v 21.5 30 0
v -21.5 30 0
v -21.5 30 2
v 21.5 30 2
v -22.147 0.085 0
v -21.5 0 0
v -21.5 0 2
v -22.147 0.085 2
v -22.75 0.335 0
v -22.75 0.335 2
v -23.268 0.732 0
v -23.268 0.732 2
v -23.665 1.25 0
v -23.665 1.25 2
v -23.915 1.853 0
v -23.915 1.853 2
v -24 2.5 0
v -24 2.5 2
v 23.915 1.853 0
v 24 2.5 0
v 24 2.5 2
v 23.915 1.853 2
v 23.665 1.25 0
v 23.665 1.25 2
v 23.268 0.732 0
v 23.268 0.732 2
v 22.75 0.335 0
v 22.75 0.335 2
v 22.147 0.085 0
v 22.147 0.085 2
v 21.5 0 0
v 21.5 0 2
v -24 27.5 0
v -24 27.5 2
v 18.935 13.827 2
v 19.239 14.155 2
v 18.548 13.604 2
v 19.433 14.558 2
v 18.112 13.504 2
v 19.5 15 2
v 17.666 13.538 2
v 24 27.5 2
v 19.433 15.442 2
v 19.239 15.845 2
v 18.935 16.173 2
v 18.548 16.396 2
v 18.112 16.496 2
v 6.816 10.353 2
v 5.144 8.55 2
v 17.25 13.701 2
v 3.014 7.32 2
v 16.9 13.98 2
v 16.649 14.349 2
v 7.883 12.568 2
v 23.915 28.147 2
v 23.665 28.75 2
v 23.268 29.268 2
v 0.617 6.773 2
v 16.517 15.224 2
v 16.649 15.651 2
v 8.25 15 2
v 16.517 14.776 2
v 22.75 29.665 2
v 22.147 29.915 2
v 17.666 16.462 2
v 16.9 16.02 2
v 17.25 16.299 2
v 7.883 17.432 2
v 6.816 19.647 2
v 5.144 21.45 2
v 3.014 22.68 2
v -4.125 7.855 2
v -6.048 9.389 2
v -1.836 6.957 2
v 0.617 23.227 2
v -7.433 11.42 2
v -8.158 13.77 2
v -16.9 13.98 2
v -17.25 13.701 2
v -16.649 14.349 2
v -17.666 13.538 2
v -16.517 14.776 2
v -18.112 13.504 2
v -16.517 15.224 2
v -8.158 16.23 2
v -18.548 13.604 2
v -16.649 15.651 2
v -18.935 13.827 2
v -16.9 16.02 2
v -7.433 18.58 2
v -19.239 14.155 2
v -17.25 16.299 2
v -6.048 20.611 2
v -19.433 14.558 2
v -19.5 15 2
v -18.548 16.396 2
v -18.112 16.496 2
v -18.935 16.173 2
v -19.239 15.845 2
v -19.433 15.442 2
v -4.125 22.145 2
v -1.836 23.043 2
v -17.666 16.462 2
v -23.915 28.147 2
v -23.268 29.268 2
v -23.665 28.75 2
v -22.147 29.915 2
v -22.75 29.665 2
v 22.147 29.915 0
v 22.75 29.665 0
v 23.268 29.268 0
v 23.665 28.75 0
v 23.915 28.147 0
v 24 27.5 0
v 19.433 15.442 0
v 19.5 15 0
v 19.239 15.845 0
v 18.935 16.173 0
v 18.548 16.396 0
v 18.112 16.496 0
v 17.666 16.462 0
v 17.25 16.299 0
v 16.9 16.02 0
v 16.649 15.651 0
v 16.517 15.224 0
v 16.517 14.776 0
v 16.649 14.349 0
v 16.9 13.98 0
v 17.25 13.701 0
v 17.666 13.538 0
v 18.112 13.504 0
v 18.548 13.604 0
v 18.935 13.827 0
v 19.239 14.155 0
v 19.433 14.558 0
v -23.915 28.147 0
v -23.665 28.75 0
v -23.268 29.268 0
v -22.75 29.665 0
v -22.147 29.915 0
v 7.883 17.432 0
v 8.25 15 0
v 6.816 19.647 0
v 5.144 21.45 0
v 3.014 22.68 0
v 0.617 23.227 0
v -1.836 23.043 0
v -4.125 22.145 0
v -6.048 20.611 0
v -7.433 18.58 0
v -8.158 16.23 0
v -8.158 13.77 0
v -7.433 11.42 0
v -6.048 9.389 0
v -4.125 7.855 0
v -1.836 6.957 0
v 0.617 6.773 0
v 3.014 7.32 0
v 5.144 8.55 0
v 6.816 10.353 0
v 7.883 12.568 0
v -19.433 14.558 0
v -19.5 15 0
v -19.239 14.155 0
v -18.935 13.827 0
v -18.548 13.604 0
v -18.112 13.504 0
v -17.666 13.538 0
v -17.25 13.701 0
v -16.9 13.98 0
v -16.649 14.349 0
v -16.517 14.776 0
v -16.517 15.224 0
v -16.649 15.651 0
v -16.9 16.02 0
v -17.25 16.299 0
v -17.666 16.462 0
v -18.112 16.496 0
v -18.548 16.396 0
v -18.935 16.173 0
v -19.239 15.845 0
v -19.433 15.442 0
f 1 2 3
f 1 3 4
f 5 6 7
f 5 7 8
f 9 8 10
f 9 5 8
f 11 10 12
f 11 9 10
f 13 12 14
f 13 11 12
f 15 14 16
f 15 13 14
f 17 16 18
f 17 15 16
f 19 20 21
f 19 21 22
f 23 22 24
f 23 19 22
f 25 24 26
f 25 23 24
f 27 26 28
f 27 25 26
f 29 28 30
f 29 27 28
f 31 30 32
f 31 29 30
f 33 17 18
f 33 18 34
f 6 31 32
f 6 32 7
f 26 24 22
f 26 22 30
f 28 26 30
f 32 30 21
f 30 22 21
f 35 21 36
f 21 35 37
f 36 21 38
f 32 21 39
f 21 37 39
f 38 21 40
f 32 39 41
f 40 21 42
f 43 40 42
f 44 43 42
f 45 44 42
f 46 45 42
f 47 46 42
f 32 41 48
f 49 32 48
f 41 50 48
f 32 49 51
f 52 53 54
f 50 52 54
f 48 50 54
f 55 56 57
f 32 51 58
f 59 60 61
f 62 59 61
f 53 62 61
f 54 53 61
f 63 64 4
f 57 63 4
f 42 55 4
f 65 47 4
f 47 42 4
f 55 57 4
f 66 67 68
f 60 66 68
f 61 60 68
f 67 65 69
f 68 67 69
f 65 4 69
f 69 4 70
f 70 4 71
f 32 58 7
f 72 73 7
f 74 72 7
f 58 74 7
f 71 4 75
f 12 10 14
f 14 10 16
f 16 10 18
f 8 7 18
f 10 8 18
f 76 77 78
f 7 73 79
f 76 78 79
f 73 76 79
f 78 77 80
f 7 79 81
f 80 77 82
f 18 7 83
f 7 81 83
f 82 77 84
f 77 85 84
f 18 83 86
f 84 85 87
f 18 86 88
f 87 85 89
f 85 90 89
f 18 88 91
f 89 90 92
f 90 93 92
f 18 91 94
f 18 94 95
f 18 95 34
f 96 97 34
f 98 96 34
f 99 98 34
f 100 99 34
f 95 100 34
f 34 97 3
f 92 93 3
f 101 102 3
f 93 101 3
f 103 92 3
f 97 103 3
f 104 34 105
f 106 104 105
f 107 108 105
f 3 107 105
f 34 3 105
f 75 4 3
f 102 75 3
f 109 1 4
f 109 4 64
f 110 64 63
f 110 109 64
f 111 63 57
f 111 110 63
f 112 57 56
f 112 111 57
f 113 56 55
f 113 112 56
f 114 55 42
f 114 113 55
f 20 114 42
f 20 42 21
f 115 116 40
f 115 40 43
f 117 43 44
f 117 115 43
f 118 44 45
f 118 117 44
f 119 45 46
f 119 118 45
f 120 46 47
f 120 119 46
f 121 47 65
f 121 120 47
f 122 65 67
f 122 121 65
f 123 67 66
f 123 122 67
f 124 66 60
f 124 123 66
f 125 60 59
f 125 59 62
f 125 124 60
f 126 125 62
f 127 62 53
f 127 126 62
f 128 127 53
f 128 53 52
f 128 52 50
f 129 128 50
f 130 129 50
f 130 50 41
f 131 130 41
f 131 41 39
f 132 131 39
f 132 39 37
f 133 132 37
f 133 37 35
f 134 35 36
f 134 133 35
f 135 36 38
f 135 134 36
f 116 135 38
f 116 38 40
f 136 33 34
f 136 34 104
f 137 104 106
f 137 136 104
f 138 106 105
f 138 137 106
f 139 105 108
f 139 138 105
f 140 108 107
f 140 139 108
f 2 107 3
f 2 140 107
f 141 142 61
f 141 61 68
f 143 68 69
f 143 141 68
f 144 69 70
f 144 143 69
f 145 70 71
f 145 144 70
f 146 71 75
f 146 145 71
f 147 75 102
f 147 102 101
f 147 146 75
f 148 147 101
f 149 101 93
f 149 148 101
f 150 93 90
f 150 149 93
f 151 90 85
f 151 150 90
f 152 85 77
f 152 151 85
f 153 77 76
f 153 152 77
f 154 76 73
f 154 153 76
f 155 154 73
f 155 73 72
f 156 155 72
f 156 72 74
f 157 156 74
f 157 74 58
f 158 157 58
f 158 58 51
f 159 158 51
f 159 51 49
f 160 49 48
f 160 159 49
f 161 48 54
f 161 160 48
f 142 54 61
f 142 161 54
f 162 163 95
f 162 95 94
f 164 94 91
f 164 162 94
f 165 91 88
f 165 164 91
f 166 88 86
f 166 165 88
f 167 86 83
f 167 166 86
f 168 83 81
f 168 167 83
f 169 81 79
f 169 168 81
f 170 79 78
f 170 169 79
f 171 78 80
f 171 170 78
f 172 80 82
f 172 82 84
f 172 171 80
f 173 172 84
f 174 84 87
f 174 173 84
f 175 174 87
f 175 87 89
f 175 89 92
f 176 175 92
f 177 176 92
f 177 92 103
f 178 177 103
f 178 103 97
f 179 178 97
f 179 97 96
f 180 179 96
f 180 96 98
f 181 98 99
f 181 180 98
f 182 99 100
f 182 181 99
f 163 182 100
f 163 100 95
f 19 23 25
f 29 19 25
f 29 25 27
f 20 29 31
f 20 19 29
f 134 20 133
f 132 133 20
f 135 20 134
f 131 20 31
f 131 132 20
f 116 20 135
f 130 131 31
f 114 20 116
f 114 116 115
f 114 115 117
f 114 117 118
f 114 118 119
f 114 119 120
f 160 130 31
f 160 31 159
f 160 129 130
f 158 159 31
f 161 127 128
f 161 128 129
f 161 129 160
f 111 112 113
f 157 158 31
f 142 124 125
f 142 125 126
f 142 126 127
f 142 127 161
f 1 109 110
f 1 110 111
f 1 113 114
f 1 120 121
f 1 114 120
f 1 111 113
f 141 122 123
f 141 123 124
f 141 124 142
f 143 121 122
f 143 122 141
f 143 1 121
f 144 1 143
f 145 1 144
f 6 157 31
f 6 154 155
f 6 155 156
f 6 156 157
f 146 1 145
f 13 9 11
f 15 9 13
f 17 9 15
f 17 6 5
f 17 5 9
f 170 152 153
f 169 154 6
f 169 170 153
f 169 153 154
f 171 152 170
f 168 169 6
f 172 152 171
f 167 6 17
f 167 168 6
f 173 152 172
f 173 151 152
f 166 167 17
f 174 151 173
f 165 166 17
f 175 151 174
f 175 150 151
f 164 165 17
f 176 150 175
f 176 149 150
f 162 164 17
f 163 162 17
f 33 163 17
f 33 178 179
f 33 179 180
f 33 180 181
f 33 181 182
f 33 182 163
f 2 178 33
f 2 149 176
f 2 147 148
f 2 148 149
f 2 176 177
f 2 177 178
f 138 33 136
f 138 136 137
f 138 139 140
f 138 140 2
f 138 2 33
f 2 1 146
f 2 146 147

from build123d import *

# Parameters (mm, degrees)
MODEL_R             = 1.5
MODEL_R_2           = 8.25
BOSS_EXTRUDE1_DEPTH = 2


with BuildPart() as part:
    # Model → Boss-Extrude1 (new body)
    with BuildSketch(Plane.XY):
        with BuildLine():
            Line((-21.5, 30), (21.5, 30))
            ThreePointArc((21.5, 30), (23.267766953, 29.267766953), (24, 27.5))
            Line((24, 27.5), (24, 2.5))
            ThreePointArc((24, 2.5), (23.267766953, 0.732233047), (21.5, 0))
            Line((21.5, 0), (-21.5, 0))
            ThreePointArc((-21.5, 0), (-23.267766953, 0.732233047), (-24, 2.5))
            Line((-24, 2.5), (-24, 27.5))
            ThreePointArc((-24, 27.5), (-23.267766953, 29.267766953), (-21.5, 30))
        make_face()
        with Locations((18, 15)):
            Circle(MODEL_R, mode=Mode.SUBTRACT)
        with Locations(Location((-18, 15, 0), (0, 0, 180))):
            Circle(MODEL_R, mode=Mode.SUBTRACT)
        with Locations((0, 15)):
            Circle(MODEL_R_2, mode=Mode.SUBTRACT)
    extrude(amount=BOSS_EXTRUDE1_DEPTH)


solid = part.part
